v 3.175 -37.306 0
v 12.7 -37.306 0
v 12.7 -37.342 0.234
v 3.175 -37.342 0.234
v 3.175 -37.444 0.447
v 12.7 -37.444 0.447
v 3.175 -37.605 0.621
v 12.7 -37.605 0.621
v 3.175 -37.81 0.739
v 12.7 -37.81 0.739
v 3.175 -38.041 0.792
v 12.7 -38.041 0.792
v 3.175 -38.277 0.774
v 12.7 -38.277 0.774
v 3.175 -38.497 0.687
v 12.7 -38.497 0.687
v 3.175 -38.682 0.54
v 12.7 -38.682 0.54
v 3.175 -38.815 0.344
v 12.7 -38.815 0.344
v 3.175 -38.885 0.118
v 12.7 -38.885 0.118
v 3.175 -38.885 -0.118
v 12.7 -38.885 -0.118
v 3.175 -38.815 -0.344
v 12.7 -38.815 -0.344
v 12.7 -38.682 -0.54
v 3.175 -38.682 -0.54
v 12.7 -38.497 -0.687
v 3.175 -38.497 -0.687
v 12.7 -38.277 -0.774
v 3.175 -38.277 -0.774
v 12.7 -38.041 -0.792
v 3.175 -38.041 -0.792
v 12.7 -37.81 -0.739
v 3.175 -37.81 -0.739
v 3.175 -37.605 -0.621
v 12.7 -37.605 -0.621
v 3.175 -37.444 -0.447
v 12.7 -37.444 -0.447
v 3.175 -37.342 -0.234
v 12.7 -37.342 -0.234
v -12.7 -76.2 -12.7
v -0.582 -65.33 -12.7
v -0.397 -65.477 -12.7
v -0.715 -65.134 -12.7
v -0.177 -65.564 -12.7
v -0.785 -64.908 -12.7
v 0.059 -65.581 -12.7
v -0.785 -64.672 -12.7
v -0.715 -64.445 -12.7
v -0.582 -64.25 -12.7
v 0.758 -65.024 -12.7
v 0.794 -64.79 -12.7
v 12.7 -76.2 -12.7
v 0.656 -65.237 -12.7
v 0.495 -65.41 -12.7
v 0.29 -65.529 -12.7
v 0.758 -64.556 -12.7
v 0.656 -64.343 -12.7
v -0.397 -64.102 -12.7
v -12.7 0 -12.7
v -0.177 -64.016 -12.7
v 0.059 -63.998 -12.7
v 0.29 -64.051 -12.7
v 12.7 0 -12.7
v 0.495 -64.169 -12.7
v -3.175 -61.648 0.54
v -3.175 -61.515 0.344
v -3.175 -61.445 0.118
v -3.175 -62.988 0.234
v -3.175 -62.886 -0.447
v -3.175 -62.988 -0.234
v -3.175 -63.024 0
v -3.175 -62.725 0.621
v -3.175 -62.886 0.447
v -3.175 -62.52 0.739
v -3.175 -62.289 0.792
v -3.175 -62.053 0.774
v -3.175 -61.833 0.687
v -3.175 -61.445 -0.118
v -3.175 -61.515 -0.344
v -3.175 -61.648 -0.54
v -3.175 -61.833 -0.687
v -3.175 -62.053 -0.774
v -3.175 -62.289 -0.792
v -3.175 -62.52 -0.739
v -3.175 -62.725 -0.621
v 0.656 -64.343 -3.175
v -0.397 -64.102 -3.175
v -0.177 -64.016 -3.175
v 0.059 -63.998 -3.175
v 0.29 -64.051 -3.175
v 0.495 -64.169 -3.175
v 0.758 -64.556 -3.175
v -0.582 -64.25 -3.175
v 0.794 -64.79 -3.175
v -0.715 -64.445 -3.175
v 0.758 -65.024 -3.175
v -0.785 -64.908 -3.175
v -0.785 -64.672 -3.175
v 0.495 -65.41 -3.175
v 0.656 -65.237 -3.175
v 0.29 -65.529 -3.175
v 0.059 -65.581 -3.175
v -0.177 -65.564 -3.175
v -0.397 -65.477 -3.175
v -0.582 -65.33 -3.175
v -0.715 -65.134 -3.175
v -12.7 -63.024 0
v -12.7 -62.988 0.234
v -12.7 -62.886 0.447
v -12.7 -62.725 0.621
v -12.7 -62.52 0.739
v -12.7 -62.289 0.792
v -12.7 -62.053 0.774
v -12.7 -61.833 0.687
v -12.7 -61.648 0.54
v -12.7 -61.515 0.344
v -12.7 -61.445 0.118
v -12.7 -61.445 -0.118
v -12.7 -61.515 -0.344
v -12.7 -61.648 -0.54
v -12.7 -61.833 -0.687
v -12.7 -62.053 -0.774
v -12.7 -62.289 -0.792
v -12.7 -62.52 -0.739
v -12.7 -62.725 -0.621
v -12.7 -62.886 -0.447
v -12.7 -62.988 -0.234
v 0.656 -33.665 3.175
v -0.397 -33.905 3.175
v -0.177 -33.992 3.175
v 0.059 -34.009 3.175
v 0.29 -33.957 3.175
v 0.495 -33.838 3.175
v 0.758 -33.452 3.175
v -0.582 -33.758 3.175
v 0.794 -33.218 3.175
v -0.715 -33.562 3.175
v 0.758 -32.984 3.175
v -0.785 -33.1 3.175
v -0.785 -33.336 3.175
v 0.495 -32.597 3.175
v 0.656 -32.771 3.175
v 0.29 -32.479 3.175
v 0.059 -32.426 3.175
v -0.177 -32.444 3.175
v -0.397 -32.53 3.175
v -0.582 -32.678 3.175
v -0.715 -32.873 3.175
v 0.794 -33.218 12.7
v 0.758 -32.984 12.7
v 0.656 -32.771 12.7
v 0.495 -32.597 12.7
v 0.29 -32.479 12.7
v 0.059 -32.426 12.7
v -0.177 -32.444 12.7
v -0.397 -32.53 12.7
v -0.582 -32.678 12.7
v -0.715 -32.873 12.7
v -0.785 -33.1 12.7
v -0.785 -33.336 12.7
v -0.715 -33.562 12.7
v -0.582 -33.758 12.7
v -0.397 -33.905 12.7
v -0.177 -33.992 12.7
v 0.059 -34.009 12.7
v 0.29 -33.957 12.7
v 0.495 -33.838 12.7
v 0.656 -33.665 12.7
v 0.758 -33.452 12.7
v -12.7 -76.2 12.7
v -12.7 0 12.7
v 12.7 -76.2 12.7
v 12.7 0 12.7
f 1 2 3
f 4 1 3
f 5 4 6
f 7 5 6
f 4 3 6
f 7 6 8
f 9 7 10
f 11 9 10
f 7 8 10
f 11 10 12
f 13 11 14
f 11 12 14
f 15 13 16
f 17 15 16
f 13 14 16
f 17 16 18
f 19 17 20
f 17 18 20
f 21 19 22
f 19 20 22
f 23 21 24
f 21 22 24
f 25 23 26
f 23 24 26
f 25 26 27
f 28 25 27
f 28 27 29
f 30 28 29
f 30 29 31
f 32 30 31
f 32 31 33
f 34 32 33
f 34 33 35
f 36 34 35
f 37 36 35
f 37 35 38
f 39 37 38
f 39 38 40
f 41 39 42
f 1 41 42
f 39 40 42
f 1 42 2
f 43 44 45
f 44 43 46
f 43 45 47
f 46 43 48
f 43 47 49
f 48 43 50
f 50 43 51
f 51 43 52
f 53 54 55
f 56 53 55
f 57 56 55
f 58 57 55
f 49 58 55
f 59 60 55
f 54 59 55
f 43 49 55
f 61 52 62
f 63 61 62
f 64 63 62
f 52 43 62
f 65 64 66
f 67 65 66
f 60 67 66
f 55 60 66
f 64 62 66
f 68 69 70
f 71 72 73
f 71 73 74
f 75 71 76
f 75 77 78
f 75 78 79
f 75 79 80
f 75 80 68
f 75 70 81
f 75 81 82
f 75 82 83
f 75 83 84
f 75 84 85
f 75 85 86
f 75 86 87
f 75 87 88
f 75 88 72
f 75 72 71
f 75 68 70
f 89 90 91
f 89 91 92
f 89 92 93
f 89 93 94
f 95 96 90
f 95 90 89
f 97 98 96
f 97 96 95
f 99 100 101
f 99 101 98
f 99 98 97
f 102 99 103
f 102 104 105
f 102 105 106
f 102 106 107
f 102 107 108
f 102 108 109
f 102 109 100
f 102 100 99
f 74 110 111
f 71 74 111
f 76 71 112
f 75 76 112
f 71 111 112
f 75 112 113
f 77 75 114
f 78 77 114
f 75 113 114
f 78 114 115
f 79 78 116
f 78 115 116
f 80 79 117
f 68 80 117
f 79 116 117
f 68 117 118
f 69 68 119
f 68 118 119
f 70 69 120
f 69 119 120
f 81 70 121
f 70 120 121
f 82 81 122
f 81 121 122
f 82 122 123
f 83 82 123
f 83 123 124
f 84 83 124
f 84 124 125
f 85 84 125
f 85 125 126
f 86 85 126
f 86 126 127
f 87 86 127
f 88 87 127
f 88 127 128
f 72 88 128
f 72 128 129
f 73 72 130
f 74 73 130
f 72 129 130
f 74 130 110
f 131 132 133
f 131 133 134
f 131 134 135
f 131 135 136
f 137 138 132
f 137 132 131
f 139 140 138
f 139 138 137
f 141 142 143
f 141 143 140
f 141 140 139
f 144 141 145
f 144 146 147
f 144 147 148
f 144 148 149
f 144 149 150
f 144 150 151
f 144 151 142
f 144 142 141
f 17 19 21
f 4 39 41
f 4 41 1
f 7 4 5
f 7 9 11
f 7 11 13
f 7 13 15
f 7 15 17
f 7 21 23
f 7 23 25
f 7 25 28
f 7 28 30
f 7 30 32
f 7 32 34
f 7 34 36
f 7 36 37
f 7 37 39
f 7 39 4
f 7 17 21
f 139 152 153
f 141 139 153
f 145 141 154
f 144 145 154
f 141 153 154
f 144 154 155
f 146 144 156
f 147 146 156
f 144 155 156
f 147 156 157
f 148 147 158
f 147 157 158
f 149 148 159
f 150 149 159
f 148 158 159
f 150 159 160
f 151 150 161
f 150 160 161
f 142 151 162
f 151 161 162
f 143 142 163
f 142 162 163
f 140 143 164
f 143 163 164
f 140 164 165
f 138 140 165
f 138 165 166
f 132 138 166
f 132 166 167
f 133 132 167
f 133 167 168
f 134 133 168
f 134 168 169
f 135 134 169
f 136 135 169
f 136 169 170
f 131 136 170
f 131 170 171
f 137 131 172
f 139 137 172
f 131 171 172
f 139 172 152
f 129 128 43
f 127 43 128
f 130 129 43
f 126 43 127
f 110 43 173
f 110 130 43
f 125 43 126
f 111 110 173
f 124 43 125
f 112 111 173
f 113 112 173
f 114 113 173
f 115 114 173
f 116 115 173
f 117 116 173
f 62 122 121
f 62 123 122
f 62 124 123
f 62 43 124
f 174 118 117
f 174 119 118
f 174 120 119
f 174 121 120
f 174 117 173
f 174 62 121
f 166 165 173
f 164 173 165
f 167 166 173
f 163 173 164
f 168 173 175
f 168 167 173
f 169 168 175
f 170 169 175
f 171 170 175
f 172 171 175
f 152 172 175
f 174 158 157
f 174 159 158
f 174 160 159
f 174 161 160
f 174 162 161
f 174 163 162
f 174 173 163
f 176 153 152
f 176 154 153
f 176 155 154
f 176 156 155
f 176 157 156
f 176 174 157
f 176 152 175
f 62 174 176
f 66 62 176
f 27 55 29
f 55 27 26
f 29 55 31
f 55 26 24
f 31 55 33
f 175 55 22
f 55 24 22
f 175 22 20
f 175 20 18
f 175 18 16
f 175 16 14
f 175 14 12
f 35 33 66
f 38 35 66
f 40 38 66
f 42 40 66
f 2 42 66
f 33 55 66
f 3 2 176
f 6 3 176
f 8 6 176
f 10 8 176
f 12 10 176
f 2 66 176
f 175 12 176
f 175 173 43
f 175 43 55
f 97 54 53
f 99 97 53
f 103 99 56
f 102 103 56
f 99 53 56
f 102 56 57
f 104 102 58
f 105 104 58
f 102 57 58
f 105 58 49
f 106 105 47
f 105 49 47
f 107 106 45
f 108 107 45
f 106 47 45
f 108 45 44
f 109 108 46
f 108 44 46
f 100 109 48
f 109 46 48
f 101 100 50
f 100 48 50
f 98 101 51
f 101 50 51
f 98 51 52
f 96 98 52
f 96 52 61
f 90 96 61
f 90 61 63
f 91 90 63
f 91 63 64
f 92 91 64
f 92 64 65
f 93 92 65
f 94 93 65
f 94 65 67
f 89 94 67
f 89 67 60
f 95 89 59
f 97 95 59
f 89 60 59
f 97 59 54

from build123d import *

# Parameters (mm, degrees)
F0_W     = 25.4
F0_H     = 25.4
F1_DEPTH = 76.2
F2_R     = 0.79375
F3_DEPTH = 9.525
F4_R     = 0.79375
F5_DEPTH = 9.525
F6_R     = 0.79375
F7_DEPTH = 9.525
F8_R     = 0.79375
F9_DEPTH = 9.525


with BuildPart() as f1:
    # F0 (on Front) → F1 (new body)
    with BuildSketch(Plane.XZ):
        Rectangle(F0_W, F0_H)
    extrude(amount=F1_DEPTH)

    # F2 (on face) → F3 (cut)
    with BuildSketch(Plane.XY.offset(12.7)):
        with Locations((0, -33.217845)):
            Circle(F2_R)
    extrude(amount=-F3_DEPTH, mode=Mode.SUBTRACT)

    # F4 (on face) → F5 (cut)
    with BuildSketch(Plane.YZ.offset(12.7)):
        with Locations((-38.1, 0)):
            Circle(F4_R)
    extrude(amount=-F5_DEPTH, mode=Mode.SUBTRACT)

    # F6 (on face) → F7 (cut)
    with BuildSketch(Plane(origin=(0, 0, -12.7), x_dir=(1, 0, 0), z_dir=(0, 0, -1))):
        with Locations((0, 64.789804)):
            Circle(F6_R)
    extrude(amount=-F7_DEPTH, mode=Mode.SUBTRACT)

    # F8 (on face) → F9 (cut)
    with BuildSketch(Plane(origin=(-12.7, 0, 0), x_dir=(0, -1, 0), z_dir=(-1, 0, 0))):
        with Locations((62.230002, 0)):
            Circle(F8_R)
    extrude(amount=-F9_DEPTH, mode=Mode.SUBTRACT)


solid = f1.part
